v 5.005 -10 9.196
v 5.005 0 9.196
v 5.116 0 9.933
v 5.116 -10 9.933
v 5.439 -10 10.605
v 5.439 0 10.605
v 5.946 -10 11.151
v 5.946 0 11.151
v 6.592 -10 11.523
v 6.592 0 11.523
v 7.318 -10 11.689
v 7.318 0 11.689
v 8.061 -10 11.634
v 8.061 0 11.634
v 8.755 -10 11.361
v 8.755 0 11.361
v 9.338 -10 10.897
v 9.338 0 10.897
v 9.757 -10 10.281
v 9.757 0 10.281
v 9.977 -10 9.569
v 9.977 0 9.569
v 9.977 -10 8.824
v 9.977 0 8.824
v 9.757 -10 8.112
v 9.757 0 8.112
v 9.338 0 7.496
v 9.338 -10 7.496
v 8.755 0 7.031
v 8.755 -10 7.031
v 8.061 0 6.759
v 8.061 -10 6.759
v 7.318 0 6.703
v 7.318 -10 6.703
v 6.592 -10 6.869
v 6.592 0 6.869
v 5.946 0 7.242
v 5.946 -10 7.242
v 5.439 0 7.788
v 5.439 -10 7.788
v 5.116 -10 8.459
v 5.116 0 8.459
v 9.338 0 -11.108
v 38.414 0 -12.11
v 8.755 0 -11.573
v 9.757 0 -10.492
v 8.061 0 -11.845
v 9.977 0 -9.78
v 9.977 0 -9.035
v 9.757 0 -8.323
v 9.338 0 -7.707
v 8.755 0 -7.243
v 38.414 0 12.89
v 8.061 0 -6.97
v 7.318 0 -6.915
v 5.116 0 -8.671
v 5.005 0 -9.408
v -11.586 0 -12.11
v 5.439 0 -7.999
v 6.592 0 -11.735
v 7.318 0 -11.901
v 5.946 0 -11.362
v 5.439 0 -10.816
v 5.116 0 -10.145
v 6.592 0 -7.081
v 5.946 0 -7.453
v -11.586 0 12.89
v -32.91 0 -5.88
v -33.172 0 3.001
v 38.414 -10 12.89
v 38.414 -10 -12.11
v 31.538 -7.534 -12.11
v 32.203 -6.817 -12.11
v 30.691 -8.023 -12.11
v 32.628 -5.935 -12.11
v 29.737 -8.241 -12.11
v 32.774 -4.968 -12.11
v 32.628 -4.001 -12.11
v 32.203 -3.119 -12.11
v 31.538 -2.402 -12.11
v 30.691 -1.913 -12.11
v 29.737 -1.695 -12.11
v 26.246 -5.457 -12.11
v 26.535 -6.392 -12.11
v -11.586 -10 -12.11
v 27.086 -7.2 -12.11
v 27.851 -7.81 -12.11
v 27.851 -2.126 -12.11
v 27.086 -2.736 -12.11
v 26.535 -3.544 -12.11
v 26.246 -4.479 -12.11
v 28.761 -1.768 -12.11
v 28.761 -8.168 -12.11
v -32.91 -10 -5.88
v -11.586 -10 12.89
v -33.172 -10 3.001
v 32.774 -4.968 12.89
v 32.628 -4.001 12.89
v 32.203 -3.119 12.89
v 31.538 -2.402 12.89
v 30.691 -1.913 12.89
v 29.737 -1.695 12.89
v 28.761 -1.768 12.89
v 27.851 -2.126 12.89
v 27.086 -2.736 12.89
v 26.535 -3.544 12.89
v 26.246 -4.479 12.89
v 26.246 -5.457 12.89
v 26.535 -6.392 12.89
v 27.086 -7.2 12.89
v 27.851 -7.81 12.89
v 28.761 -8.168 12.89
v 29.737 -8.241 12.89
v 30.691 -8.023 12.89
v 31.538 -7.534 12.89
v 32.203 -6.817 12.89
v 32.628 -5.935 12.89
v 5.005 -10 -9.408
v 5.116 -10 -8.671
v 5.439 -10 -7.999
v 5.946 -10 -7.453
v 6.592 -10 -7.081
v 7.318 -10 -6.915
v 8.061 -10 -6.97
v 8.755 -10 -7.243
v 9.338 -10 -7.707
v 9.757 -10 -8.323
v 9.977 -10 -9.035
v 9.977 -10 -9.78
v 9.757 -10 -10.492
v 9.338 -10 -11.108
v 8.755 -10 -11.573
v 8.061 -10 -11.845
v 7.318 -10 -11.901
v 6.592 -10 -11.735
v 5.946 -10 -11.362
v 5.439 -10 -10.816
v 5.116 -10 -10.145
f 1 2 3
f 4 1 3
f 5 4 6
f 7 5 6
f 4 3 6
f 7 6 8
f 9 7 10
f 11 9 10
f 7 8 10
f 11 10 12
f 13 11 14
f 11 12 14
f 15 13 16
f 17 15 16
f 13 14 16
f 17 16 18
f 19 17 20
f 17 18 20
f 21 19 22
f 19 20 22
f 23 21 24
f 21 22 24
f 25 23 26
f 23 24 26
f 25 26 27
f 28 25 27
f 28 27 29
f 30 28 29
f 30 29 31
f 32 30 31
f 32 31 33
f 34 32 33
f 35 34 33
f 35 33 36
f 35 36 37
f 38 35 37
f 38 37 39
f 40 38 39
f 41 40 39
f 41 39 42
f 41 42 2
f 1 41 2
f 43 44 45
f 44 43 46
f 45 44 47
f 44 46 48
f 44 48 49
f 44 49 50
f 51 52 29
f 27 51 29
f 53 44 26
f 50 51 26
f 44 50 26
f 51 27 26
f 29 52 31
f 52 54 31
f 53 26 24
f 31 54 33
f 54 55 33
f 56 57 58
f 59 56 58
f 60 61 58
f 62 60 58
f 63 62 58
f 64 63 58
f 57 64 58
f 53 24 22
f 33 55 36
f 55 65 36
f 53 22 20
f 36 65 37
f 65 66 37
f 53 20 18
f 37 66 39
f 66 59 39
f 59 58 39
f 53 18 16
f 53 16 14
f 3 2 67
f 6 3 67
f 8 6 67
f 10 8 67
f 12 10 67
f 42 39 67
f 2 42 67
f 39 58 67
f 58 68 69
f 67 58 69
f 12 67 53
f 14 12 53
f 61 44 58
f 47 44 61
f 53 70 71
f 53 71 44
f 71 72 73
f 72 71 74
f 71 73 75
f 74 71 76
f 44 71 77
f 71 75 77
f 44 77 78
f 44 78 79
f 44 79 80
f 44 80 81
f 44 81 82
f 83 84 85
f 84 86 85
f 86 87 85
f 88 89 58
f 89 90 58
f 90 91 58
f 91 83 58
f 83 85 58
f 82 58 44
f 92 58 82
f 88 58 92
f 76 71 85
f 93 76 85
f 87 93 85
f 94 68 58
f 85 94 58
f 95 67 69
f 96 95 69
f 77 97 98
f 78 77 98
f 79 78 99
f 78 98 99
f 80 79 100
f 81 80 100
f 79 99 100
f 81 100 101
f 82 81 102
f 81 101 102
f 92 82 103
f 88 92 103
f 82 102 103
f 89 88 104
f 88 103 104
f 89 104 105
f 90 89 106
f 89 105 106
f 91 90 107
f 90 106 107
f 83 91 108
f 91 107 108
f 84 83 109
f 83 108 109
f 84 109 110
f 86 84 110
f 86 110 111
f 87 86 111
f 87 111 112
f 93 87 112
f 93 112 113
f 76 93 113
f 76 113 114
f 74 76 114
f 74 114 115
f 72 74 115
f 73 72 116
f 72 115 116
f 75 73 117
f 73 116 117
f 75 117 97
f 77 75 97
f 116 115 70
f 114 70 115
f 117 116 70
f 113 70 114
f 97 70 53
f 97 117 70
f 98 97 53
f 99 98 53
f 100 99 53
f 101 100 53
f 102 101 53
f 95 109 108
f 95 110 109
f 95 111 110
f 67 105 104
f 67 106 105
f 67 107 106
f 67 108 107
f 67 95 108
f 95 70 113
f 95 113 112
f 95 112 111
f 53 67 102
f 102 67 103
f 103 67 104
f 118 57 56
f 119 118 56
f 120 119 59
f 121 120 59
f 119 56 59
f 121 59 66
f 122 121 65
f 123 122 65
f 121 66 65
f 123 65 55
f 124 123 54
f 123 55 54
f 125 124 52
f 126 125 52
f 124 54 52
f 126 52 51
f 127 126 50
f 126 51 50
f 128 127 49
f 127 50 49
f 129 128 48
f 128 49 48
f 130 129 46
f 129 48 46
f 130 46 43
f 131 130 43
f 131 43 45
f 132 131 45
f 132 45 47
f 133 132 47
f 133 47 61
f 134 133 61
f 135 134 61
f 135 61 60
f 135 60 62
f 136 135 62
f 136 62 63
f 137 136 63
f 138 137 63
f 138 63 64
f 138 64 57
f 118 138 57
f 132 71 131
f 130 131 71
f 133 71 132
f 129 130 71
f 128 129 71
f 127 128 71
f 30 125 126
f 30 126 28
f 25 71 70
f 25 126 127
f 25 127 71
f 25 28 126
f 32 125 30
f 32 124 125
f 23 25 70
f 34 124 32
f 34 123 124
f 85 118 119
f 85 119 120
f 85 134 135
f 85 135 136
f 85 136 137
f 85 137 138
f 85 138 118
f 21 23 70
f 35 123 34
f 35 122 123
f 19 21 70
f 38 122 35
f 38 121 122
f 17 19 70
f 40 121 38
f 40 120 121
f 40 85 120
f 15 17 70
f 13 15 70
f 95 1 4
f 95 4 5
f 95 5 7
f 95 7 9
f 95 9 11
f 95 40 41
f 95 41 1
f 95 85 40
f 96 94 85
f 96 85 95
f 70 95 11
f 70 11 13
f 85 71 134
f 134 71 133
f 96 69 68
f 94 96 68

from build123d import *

# Parameters (mm, degrees)
F0_W     = 25
F0_H     = 25
F1_DEPTH = 10
F3_D     = 5
F4_W     = 10
F4_H     = 25
F5_DEPTH = 25
F6_R     = 3.281956
F7_DEPTH = 25


with BuildPart() as f1:
    # F0 (on Front) → F1 (new body)
    with BuildSketch(Plane.XZ):
        Polygon((-11.585821, -12.109886), (-11.585821, 12.890114), (-33.171643, 3.001011), (-32.910448, -5.879586), align=None)
        with Locations((0.914179, 0.390114)):
            Rectangle(F0_W, F0_H)
    extrude(amount=F1_DEPTH)

    # F3 (through all)
    with Locations(Plane.XZ.offset(10)):
        with Locations((7.505033, 9.196309), (7.505033, -9.407719)):
            Hole(F3_D / 2)

    # F4 (on face) → F5 (join)
    with BuildSketch(Plane.YZ.offset(13.414179)):
        with Locations((-5, 0.390114)):
            Rectangle(F4_W, F4_H)
    extrude(amount=F5_DEPTH)

    # F6 (on face) → F7 (cut)
    with BuildSketch(Plane.XY.offset(12.890114)):
        with Locations((29.491611, -4.968121)):
            Circle(F6_R)
    extrude(amount=-F7_DEPTH, mode=Mode.SUBTRACT)


solid = f1.part
